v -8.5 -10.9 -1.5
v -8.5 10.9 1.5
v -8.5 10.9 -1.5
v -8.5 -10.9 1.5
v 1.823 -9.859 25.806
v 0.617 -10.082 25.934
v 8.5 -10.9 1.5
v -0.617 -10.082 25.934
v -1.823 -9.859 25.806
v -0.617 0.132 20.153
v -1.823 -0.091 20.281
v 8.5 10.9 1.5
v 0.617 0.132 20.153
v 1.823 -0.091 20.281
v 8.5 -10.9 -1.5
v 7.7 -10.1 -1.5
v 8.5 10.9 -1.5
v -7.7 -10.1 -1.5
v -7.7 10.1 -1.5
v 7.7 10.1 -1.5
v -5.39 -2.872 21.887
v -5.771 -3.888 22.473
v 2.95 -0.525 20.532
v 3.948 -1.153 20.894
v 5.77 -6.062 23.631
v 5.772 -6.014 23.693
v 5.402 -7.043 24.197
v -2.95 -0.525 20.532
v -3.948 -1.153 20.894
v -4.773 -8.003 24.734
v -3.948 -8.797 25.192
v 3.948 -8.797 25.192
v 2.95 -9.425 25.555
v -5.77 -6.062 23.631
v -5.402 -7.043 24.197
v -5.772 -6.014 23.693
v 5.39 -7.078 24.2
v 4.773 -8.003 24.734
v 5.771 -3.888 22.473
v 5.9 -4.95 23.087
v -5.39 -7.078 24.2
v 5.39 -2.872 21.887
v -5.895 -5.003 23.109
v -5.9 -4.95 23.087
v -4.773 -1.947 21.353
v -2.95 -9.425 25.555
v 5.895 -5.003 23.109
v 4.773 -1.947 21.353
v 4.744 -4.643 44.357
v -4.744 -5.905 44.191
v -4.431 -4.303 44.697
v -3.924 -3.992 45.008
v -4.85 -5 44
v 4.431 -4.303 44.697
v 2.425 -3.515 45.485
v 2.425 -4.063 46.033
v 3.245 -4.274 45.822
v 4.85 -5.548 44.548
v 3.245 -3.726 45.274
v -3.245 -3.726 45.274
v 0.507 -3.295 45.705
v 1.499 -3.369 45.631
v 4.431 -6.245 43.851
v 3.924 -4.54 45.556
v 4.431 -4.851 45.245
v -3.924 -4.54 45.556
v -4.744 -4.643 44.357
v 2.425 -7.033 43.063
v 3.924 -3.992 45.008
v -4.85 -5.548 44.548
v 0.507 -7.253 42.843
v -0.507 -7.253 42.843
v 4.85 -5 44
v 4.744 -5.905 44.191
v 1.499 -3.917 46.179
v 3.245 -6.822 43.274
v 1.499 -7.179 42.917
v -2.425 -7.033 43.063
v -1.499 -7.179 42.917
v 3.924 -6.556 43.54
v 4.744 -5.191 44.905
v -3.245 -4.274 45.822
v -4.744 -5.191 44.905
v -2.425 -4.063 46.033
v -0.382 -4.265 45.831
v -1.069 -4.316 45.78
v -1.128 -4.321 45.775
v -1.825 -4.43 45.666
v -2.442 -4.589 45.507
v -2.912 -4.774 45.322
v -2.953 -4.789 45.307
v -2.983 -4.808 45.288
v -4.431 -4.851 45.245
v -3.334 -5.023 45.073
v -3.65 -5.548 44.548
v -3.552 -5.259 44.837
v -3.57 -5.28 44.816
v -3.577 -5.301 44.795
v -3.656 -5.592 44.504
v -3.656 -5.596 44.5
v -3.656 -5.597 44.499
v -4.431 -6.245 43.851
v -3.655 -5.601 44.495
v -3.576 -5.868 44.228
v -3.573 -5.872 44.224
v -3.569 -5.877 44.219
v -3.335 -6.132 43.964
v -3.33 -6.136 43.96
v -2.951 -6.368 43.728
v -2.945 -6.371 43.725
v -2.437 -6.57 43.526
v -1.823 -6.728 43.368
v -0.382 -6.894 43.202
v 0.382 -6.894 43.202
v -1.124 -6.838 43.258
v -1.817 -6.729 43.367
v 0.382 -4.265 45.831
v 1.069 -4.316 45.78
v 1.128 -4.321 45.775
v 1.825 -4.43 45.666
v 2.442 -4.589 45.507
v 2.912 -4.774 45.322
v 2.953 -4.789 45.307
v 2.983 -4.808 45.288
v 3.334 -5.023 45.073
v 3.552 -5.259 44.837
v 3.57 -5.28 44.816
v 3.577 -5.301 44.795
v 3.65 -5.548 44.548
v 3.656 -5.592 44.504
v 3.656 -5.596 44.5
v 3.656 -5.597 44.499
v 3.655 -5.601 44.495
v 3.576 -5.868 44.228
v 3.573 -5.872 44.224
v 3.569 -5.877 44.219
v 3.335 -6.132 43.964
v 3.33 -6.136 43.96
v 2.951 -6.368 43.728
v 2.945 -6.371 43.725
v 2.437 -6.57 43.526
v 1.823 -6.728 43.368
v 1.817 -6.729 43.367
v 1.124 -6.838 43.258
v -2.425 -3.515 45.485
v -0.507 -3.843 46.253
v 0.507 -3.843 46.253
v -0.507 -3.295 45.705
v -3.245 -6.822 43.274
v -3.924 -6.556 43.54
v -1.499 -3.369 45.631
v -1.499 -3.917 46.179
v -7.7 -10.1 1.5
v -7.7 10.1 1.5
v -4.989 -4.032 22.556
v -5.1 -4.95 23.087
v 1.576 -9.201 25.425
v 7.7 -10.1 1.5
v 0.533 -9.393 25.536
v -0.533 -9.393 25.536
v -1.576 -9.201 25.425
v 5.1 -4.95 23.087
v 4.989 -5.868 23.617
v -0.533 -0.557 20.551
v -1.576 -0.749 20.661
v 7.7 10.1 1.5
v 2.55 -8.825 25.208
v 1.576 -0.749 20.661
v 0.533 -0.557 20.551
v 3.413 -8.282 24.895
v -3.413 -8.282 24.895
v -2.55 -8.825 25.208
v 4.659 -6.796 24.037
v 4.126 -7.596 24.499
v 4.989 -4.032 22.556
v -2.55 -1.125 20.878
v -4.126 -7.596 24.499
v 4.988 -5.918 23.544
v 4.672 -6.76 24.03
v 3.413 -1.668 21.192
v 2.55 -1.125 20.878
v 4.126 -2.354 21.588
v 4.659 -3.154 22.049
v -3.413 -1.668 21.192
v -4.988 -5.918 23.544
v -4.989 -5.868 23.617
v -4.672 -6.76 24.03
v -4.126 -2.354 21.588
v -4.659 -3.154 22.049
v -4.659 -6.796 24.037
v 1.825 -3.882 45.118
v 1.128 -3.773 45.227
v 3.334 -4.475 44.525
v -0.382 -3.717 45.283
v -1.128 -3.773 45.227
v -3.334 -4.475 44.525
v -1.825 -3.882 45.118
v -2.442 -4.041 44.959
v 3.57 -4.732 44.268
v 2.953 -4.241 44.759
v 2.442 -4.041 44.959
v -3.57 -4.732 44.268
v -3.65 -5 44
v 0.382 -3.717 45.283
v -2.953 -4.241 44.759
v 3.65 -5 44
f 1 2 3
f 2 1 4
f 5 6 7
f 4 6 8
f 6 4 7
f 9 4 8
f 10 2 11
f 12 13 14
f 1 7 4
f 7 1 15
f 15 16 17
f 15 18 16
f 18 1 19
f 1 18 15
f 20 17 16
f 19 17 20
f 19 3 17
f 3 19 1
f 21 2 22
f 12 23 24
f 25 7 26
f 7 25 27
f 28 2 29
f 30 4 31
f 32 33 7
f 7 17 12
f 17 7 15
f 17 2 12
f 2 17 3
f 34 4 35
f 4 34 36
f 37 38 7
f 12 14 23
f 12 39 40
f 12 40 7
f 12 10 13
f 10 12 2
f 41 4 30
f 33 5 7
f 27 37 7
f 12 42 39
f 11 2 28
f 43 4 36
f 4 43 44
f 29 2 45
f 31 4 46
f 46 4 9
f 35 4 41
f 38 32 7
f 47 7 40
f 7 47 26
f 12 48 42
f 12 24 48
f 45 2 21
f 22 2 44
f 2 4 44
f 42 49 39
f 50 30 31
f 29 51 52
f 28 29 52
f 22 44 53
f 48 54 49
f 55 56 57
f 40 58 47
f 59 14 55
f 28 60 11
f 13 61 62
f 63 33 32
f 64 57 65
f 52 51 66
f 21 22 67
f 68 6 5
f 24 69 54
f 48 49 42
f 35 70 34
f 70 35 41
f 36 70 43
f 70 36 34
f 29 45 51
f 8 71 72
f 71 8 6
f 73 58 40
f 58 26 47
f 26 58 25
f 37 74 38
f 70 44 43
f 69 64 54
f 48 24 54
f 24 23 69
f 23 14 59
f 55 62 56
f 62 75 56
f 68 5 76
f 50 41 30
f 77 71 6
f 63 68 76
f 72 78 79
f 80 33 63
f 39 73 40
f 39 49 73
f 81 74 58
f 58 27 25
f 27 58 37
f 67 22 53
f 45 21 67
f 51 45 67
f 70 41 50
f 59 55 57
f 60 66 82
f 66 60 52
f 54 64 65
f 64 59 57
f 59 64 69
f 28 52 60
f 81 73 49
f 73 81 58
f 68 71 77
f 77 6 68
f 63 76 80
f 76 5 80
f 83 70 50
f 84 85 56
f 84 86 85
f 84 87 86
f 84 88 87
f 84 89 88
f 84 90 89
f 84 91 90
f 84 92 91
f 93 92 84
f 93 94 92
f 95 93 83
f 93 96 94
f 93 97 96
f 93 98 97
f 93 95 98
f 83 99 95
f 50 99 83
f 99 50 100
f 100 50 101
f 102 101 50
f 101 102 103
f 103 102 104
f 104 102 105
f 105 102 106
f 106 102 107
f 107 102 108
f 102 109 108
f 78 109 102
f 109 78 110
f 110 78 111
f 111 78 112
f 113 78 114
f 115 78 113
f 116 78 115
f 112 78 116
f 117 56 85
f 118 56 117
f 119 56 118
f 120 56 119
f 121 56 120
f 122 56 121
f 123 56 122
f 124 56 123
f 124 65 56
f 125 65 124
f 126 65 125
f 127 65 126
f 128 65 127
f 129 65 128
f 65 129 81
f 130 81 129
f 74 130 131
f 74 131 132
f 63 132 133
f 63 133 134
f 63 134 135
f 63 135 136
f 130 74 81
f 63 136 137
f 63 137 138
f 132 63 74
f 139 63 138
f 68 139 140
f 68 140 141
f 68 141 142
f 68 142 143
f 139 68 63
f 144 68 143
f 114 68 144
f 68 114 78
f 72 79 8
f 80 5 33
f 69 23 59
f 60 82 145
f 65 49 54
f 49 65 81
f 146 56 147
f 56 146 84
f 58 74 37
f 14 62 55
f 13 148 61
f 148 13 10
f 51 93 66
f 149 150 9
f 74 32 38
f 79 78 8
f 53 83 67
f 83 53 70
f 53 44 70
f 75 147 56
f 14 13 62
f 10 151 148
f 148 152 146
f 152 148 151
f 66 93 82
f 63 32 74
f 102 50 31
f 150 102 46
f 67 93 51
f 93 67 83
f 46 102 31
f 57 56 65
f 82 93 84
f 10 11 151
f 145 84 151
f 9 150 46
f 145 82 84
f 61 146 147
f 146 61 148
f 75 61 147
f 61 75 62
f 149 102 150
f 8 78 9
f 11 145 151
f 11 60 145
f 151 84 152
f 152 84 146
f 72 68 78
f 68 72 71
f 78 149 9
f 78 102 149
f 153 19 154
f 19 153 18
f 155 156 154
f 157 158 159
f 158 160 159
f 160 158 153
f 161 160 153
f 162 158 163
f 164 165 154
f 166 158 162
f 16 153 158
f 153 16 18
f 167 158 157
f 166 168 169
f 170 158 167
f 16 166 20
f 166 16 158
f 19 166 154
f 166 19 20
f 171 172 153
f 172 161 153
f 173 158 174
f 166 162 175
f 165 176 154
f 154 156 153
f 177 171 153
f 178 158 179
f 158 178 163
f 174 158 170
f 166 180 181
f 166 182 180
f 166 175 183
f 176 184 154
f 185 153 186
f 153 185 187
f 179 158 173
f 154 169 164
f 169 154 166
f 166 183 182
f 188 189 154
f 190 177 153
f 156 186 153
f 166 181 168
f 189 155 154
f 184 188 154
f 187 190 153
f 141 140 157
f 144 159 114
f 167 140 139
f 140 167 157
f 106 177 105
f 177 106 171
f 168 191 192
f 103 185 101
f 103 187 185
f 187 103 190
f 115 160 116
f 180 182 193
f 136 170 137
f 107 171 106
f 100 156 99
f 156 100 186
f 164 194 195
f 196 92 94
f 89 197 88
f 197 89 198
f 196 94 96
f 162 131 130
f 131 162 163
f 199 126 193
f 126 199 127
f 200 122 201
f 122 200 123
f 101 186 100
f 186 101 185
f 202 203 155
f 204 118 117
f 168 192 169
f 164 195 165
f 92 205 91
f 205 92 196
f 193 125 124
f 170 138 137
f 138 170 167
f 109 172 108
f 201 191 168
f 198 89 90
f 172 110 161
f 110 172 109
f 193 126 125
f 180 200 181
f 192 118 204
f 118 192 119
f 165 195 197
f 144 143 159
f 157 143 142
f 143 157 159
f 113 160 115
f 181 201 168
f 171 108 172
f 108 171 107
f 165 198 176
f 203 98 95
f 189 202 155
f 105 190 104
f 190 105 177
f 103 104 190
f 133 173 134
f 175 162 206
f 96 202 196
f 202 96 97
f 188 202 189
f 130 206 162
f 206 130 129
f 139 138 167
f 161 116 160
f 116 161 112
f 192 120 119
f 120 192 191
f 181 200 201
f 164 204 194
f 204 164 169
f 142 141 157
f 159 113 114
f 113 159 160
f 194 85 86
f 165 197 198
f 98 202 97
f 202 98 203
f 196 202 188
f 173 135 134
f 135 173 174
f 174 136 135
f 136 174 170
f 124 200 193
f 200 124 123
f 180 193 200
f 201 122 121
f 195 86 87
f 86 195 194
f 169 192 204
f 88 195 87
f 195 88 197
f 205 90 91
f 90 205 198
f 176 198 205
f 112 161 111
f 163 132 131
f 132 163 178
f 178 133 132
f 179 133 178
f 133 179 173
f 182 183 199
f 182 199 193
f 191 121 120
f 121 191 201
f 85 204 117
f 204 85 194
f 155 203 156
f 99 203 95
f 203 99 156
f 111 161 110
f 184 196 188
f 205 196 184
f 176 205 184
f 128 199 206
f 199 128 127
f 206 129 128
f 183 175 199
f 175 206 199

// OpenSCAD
$fs=0.1;
module FanDuct() {
	tol=0.10;
	wallThickness=0.8;

	module Shape(dia) {
		hull() {
			cube([15.2+dia*2,20+dia*2,3],center=true);
			translate([0,-5,23])rotate([-30,0,0])cylinder(h=0.1,d=10+dia*2);
		}
		hull() {
			translate([0,-5,23])rotate([-30,0,0])cylinder(h=0.1,d=10+dia*2);
			translate([0,-5,44])rotate([45,0,0])scale([1.0,0.5,1])cylinder(h=0.85-dia/12,d=7+dia*3);
		}
	}

	difference() {
		Shape(dia=wallThickness+tol);
		Shape(dia=tol);
	}
}


FanDuct();
